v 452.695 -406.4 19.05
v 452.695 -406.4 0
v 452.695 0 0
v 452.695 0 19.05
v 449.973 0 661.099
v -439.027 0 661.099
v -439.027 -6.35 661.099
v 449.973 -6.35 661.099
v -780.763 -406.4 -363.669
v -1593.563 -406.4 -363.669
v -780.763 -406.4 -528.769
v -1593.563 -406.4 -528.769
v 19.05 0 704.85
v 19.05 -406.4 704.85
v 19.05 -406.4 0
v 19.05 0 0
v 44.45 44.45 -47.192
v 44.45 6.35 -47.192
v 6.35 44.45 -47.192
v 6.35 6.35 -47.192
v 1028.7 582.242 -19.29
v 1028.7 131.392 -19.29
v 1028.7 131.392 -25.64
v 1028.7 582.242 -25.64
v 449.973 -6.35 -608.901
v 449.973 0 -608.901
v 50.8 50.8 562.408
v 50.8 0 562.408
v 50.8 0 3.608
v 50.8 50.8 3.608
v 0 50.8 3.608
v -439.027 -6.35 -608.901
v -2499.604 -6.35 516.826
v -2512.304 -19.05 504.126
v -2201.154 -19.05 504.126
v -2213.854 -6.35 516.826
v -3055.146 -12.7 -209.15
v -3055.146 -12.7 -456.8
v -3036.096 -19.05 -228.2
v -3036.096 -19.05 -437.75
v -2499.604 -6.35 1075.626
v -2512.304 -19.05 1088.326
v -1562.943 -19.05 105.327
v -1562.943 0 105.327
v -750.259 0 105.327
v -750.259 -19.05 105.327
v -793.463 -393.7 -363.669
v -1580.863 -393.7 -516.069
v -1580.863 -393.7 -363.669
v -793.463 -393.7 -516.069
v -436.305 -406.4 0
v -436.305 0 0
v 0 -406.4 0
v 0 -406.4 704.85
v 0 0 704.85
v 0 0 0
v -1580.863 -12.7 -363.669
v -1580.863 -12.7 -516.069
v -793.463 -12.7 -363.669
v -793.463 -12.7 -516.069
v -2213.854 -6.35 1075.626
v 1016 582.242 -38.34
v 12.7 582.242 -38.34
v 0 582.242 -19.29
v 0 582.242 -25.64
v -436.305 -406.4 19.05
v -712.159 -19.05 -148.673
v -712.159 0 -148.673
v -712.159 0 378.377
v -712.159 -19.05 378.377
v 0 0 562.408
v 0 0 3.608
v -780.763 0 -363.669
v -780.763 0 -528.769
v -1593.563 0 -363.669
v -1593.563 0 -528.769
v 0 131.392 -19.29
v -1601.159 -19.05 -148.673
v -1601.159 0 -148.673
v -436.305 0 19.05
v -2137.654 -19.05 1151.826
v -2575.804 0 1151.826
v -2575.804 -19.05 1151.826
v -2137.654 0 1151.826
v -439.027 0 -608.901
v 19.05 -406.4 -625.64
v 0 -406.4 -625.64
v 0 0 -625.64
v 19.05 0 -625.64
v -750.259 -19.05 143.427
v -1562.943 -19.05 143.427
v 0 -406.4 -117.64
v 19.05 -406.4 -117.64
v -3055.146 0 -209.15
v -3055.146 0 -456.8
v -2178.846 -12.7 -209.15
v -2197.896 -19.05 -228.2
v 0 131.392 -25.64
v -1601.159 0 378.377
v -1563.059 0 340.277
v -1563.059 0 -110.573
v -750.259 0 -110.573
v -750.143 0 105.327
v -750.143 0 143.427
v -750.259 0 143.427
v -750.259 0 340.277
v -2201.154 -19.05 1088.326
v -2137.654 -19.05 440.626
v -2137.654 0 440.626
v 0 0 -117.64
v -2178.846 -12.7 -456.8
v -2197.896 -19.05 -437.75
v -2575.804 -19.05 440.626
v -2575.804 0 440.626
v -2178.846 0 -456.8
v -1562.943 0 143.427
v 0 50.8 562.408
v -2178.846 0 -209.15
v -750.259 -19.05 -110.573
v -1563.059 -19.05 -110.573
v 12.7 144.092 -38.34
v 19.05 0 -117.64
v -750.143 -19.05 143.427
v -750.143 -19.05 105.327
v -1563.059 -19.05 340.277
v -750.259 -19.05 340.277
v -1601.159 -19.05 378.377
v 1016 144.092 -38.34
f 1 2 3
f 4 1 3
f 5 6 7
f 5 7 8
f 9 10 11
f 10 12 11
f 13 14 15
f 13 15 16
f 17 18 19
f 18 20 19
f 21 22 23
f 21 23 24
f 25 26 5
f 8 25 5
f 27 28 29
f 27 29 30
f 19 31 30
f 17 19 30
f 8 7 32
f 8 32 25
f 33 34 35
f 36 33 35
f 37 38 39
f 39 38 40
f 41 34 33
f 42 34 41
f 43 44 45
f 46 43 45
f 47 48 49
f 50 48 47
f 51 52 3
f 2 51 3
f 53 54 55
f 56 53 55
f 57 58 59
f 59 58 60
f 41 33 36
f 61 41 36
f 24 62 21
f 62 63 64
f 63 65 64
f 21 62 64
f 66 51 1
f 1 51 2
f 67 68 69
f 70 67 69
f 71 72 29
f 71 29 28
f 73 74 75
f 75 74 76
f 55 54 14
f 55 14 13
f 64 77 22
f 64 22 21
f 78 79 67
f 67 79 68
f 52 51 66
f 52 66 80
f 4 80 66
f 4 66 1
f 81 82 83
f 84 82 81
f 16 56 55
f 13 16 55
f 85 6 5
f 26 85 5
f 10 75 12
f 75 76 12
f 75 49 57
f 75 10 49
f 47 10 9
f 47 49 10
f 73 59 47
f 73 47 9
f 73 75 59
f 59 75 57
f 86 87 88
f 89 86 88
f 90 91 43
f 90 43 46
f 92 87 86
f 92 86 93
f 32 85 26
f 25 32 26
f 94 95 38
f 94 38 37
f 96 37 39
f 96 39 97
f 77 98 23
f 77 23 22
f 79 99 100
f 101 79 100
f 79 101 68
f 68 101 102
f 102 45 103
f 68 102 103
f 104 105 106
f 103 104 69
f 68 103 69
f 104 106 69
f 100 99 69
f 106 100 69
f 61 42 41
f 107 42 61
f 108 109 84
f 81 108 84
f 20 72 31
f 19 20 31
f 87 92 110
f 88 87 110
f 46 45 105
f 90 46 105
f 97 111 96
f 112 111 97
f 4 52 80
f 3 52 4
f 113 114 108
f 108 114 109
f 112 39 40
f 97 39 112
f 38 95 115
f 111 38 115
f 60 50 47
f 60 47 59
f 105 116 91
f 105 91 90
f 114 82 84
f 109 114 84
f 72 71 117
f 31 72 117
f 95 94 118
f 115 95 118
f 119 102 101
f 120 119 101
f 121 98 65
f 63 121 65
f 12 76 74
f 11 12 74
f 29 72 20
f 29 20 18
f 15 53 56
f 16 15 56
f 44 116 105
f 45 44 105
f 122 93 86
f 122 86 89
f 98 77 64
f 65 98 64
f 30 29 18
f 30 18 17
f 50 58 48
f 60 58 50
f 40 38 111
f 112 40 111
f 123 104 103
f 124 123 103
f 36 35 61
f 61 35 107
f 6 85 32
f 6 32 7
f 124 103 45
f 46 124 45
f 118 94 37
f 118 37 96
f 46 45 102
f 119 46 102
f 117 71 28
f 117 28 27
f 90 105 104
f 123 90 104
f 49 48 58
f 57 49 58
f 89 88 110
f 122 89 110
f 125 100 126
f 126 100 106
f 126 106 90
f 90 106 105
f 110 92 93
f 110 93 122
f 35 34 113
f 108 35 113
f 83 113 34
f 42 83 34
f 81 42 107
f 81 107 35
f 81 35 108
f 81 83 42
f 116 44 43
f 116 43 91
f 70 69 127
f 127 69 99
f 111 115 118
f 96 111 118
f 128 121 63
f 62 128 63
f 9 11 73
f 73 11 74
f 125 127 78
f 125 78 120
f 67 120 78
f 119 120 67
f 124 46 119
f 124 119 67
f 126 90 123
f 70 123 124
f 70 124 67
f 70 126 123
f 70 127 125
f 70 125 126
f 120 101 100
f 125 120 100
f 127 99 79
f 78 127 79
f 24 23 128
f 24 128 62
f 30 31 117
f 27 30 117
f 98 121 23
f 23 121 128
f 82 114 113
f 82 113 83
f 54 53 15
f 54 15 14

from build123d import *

# Parameters (mm, degrees)
F0_W      = 889
F0_H      = 1270
F1_DEPTH  = 6.35
F2_W      = 406.4
F2_H      = 508
F3_DEPTH  = 19.05
F4_W      = 889
F4_H      = 406.4
F5_DEPTH  = 19.05
F6_W      = 50.8
F6_H      = 609.6
F7_DEPTH  = 50.8
F8_SIZE2  = 50.8
F8_SIZE   = 6.35
F9_W      = 450.85
F9_H      = 19.05
F10_DEPTH = 1028.7
F11_SIZE  = 12.7
F12_W     = 406.4
F12_H     = 704.85
F13_DEPTH = 19.05
F14_W     = 38.1
F14_H     = 450.85
F15_DEPTH = 19.05
F14_W_2   = 812.6832866201
F14_H_2   = 38.1
F16_W     = 812.8
F16_H     = 12.7
F17_DEPTH = 406.4
F18_W     = 787.4
F18_H     = 12.7
F18_W_2   = 12.7
F18_H_2   = 381
F19_DEPTH = 152.4
F20_W     = 876.3
F20_H     = 247.65
F21_DEPTH = 19.05
F22_SIZE2 = 6.35
F22_SIZE  = 19.05
F23_W     = 438.15
F23_H     = 711.2
F23_W_2   = 285.75
F23_H_2   = 558.8
F24_DEPTH = 19.05
F25_SIZE  = 12.7
F26_W     = 285.75
F26_H     = 558.8
F27_DEPTH = 6.35


with BuildPart() as f1:
    # F0 (on Front) → F1 (new body)
    with BuildSketch(Plane.XZ):
        with Locations((5.4728352126, 26.0989052054)):
            Rectangle(F0_W, F0_H)
    extrude(amount=F1_DEPTH)


with BuildPart() as f3:
    # F2 (on Right) → F3 (new body)
    with BuildSketch(Plane.YZ):
        with Locations((-203.2, -371.6401337114)):
            Rectangle(F2_W, F2_H)
    extrude(amount=F3_DEPTH)


with BuildPart() as f5:
    # F4 (on Top) → F5 (new body)
    with BuildSketch(Plane.XY):
        with Locations((8.1950770849, -203.2)):
            Rectangle(F4_W, F4_H)
    extrude(amount=F5_DEPTH)


with BuildPart() as f7:
    # F6 (on Right) → F7 (new body)
    with BuildSketch(Plane.YZ):
        with Locations((25.4, 257.6080970049)):
            Rectangle(F6_W, F6_H)
    extrude(amount=F7_DEPTH)

    # F8
    f8_edges = [f7.edges().sort_by_distance(p)[0] for p in [
        (50.8, 25.4, -47.191903),
        (25.4, 50.8, -47.191903),
        (0, 25.4, -47.191903),
        (25.4, 0, -47.191903),
    ]]
    f8_side = f7.faces().sort_by_distance((25.4, 25.4, -47.191903))[0]
    chamfer(f8_edges, length=F8_SIZE, length2=F8_SIZE2, reference=f8_side)


with BuildPart() as f10:
    # F9 (on Right) → F10 (new body)
    with BuildSketch(Plane.YZ):
        with Locations((356.8171710134, -28.8148357306)):
            Rectangle(F9_W, F9_H)
    extrude(amount=F10_DEPTH)

    # F11
    f11_edges = [f10.edges().sort_by_distance(p)[0] for p in [
        (1028.7, 356.817171, -38.339836),
        (514.35, 131.392171, -38.339836),
        (0, 356.817171, -38.339836),
    ]]
    chamfer(f11_edges, length=F11_SIZE)


with BuildPart() as f13:
    # F12 (on Right) → F13 (new body)
    with BuildSketch(Plane.YZ):
        with Locations((-203.2, 352.425)):
            Rectangle(F12_W, F12_H)
    extrude(amount=F13_DEPTH)


with BuildPart() as f15:
    # F14 (on Front) → F15 (new body)
    with BuildSketch(Plane.XZ):
        Polygon((-712.1593940044, 378.3770244002), (-1601.1593940044, 378.3770244002), (-1601.1593940044, 340.2770244002), (-1563.0593940044, 340.2770244002), (-750.2593940044, 340.2770244002), (-712.1593940044, 340.2770244002), align=None)
        with Locations((-1582.1093940044, 114.8520244002)):
            Rectangle(F14_W, F14_H)
        Polygon((-1563.0593940044, -110.5729755998), (-1601.1593940044, -110.5729755998), (-1601.1593940044, -148.6729755998), (-712.1593940044, -148.6729755998), (-712.1593940044, -110.5729755998), (-750.2593940044, -110.5729755998), align=None)
        Polygon((-712.1593940044, -110.5729755998), (-712.1593940044, 340.2770244002), (-750.2593940044, 340.2770244002), (-750.2593940044, 143.4270244002), (-750.1426806245, 143.4270244002), (-750.1426806245, 105.3270244002), (-750.2593940044, 105.3270244002), (-750.2593940044, -110.5729755998), align=None)
    extrude(amount=F15_DEPTH)


with BuildPart() as f15b:
    # F14 (on Front) → F15, piece 2 (new body)
    with BuildSketch(Plane.XZ):
        with Locations((-1156.6010373144, 124.3770244002)):
            Rectangle(F14_W_2, F14_H_2)
    extrude(amount=F15_DEPTH)


with BuildPart() as f17:
    # F16 (on Front) → F17 (new body)
    with BuildSketch(Plane.XZ):
        with Locations((-1187.1631792356, -522.4187374115)):
            Rectangle(F16_W, F16_H)
    extrude(amount=F17_DEPTH)

    # F18 (on face) → F19 (join)
    with BuildSketch(Plane.XY.offset(-516.0687374115)):
        with Locations((-1187.1631792356, -6.35)):
            Rectangle(F18_W, F18_H)
        with Locations((-787.1131792356, -203.2)):
            Rectangle(F18_W_2, F18_H_2)
        with Locations((-1187.1631792356, -400.05)):
            Rectangle(F18_W, F18_H)
        with Locations((-1587.2131792356, -203.2)):
            Rectangle(F18_W_2, F18_H_2)
        with Locations((-787.1131792356, -6.35)):
            Rectangle(F18_W_2, F18_H)
        with Locations((-787.1131792356, -400.05)):
            Rectangle(F18_W_2, F18_H)
        with Locations((-1587.2131792356, -400.05)):
            Rectangle(F18_W_2, F18_H)
        with Locations((-1587.2131792356, -6.35)):
            Rectangle(F18_W_2, F18_H)
    extrude(amount=F19_DEPTH)


with BuildPart() as f21:
    # F20 (on Front) → F21 (new body)
    with BuildSketch(Plane.XZ):
        with Locations((-2616.9959285736, -332.9746895482)):
            Rectangle(F20_W, F20_H)
    extrude(amount=F21_DEPTH)

    # F22
    f22_edges = [f21.edges().sort_by_distance(p)[0] for p in [
        (-2616.995929, -19.05, -209.14969),
        (-2178.845929, -19.05, -332.97469),
        (-2616.995929, -19.05, -456.79969),
        (-3055.145929, -19.05, -332.97469),
    ]]
    f22_side = f21.faces().sort_by_distance((-2616.995929, -19.05, -332.97469))[0]
    chamfer(f22_edges, length=F22_SIZE, length2=F22_SIZE2, reference=f22_side)


with BuildPart() as f24:
    # F23 (on Front) → F24 (new body)
    with BuildSketch(Plane.XZ):
        with Locations((-2356.7285892487, 796.2256377697)):
            Rectangle(F23_W, F23_H)
        with Locations((-2356.7285892487, 796.2256377697)):
            Rectangle(F23_W_2, F23_H_2, mode=Mode.SUBTRACT)
    extrude(amount=F24_DEPTH)

    # F25
    f25_edges = [f24.edges().sort_by_distance(p)[0] for p in [
        (-2499.603589, -19.05, 796.225638),
        (-2356.728589, -19.05, 1075.625638),
        (-2213.853589, -19.05, 796.225638),
        (-2356.728589, -19.05, 516.825638),
    ]]
    chamfer(f25_edges, length=F25_SIZE)

    # F26 (on Front) → F27 (join)
    with BuildSketch(Plane.XZ):
        with Locations((-2356.7285892487, 796.2256377697)):
            Rectangle(F26_W, F26_H)
    extrude(amount=F27_DEPTH)


solid = Compound([f1.part, f3.part, f5.part, f7.part, f10.part, f13.part, f15.part, f15b.part, f17.part, f21.part, f24.part])
